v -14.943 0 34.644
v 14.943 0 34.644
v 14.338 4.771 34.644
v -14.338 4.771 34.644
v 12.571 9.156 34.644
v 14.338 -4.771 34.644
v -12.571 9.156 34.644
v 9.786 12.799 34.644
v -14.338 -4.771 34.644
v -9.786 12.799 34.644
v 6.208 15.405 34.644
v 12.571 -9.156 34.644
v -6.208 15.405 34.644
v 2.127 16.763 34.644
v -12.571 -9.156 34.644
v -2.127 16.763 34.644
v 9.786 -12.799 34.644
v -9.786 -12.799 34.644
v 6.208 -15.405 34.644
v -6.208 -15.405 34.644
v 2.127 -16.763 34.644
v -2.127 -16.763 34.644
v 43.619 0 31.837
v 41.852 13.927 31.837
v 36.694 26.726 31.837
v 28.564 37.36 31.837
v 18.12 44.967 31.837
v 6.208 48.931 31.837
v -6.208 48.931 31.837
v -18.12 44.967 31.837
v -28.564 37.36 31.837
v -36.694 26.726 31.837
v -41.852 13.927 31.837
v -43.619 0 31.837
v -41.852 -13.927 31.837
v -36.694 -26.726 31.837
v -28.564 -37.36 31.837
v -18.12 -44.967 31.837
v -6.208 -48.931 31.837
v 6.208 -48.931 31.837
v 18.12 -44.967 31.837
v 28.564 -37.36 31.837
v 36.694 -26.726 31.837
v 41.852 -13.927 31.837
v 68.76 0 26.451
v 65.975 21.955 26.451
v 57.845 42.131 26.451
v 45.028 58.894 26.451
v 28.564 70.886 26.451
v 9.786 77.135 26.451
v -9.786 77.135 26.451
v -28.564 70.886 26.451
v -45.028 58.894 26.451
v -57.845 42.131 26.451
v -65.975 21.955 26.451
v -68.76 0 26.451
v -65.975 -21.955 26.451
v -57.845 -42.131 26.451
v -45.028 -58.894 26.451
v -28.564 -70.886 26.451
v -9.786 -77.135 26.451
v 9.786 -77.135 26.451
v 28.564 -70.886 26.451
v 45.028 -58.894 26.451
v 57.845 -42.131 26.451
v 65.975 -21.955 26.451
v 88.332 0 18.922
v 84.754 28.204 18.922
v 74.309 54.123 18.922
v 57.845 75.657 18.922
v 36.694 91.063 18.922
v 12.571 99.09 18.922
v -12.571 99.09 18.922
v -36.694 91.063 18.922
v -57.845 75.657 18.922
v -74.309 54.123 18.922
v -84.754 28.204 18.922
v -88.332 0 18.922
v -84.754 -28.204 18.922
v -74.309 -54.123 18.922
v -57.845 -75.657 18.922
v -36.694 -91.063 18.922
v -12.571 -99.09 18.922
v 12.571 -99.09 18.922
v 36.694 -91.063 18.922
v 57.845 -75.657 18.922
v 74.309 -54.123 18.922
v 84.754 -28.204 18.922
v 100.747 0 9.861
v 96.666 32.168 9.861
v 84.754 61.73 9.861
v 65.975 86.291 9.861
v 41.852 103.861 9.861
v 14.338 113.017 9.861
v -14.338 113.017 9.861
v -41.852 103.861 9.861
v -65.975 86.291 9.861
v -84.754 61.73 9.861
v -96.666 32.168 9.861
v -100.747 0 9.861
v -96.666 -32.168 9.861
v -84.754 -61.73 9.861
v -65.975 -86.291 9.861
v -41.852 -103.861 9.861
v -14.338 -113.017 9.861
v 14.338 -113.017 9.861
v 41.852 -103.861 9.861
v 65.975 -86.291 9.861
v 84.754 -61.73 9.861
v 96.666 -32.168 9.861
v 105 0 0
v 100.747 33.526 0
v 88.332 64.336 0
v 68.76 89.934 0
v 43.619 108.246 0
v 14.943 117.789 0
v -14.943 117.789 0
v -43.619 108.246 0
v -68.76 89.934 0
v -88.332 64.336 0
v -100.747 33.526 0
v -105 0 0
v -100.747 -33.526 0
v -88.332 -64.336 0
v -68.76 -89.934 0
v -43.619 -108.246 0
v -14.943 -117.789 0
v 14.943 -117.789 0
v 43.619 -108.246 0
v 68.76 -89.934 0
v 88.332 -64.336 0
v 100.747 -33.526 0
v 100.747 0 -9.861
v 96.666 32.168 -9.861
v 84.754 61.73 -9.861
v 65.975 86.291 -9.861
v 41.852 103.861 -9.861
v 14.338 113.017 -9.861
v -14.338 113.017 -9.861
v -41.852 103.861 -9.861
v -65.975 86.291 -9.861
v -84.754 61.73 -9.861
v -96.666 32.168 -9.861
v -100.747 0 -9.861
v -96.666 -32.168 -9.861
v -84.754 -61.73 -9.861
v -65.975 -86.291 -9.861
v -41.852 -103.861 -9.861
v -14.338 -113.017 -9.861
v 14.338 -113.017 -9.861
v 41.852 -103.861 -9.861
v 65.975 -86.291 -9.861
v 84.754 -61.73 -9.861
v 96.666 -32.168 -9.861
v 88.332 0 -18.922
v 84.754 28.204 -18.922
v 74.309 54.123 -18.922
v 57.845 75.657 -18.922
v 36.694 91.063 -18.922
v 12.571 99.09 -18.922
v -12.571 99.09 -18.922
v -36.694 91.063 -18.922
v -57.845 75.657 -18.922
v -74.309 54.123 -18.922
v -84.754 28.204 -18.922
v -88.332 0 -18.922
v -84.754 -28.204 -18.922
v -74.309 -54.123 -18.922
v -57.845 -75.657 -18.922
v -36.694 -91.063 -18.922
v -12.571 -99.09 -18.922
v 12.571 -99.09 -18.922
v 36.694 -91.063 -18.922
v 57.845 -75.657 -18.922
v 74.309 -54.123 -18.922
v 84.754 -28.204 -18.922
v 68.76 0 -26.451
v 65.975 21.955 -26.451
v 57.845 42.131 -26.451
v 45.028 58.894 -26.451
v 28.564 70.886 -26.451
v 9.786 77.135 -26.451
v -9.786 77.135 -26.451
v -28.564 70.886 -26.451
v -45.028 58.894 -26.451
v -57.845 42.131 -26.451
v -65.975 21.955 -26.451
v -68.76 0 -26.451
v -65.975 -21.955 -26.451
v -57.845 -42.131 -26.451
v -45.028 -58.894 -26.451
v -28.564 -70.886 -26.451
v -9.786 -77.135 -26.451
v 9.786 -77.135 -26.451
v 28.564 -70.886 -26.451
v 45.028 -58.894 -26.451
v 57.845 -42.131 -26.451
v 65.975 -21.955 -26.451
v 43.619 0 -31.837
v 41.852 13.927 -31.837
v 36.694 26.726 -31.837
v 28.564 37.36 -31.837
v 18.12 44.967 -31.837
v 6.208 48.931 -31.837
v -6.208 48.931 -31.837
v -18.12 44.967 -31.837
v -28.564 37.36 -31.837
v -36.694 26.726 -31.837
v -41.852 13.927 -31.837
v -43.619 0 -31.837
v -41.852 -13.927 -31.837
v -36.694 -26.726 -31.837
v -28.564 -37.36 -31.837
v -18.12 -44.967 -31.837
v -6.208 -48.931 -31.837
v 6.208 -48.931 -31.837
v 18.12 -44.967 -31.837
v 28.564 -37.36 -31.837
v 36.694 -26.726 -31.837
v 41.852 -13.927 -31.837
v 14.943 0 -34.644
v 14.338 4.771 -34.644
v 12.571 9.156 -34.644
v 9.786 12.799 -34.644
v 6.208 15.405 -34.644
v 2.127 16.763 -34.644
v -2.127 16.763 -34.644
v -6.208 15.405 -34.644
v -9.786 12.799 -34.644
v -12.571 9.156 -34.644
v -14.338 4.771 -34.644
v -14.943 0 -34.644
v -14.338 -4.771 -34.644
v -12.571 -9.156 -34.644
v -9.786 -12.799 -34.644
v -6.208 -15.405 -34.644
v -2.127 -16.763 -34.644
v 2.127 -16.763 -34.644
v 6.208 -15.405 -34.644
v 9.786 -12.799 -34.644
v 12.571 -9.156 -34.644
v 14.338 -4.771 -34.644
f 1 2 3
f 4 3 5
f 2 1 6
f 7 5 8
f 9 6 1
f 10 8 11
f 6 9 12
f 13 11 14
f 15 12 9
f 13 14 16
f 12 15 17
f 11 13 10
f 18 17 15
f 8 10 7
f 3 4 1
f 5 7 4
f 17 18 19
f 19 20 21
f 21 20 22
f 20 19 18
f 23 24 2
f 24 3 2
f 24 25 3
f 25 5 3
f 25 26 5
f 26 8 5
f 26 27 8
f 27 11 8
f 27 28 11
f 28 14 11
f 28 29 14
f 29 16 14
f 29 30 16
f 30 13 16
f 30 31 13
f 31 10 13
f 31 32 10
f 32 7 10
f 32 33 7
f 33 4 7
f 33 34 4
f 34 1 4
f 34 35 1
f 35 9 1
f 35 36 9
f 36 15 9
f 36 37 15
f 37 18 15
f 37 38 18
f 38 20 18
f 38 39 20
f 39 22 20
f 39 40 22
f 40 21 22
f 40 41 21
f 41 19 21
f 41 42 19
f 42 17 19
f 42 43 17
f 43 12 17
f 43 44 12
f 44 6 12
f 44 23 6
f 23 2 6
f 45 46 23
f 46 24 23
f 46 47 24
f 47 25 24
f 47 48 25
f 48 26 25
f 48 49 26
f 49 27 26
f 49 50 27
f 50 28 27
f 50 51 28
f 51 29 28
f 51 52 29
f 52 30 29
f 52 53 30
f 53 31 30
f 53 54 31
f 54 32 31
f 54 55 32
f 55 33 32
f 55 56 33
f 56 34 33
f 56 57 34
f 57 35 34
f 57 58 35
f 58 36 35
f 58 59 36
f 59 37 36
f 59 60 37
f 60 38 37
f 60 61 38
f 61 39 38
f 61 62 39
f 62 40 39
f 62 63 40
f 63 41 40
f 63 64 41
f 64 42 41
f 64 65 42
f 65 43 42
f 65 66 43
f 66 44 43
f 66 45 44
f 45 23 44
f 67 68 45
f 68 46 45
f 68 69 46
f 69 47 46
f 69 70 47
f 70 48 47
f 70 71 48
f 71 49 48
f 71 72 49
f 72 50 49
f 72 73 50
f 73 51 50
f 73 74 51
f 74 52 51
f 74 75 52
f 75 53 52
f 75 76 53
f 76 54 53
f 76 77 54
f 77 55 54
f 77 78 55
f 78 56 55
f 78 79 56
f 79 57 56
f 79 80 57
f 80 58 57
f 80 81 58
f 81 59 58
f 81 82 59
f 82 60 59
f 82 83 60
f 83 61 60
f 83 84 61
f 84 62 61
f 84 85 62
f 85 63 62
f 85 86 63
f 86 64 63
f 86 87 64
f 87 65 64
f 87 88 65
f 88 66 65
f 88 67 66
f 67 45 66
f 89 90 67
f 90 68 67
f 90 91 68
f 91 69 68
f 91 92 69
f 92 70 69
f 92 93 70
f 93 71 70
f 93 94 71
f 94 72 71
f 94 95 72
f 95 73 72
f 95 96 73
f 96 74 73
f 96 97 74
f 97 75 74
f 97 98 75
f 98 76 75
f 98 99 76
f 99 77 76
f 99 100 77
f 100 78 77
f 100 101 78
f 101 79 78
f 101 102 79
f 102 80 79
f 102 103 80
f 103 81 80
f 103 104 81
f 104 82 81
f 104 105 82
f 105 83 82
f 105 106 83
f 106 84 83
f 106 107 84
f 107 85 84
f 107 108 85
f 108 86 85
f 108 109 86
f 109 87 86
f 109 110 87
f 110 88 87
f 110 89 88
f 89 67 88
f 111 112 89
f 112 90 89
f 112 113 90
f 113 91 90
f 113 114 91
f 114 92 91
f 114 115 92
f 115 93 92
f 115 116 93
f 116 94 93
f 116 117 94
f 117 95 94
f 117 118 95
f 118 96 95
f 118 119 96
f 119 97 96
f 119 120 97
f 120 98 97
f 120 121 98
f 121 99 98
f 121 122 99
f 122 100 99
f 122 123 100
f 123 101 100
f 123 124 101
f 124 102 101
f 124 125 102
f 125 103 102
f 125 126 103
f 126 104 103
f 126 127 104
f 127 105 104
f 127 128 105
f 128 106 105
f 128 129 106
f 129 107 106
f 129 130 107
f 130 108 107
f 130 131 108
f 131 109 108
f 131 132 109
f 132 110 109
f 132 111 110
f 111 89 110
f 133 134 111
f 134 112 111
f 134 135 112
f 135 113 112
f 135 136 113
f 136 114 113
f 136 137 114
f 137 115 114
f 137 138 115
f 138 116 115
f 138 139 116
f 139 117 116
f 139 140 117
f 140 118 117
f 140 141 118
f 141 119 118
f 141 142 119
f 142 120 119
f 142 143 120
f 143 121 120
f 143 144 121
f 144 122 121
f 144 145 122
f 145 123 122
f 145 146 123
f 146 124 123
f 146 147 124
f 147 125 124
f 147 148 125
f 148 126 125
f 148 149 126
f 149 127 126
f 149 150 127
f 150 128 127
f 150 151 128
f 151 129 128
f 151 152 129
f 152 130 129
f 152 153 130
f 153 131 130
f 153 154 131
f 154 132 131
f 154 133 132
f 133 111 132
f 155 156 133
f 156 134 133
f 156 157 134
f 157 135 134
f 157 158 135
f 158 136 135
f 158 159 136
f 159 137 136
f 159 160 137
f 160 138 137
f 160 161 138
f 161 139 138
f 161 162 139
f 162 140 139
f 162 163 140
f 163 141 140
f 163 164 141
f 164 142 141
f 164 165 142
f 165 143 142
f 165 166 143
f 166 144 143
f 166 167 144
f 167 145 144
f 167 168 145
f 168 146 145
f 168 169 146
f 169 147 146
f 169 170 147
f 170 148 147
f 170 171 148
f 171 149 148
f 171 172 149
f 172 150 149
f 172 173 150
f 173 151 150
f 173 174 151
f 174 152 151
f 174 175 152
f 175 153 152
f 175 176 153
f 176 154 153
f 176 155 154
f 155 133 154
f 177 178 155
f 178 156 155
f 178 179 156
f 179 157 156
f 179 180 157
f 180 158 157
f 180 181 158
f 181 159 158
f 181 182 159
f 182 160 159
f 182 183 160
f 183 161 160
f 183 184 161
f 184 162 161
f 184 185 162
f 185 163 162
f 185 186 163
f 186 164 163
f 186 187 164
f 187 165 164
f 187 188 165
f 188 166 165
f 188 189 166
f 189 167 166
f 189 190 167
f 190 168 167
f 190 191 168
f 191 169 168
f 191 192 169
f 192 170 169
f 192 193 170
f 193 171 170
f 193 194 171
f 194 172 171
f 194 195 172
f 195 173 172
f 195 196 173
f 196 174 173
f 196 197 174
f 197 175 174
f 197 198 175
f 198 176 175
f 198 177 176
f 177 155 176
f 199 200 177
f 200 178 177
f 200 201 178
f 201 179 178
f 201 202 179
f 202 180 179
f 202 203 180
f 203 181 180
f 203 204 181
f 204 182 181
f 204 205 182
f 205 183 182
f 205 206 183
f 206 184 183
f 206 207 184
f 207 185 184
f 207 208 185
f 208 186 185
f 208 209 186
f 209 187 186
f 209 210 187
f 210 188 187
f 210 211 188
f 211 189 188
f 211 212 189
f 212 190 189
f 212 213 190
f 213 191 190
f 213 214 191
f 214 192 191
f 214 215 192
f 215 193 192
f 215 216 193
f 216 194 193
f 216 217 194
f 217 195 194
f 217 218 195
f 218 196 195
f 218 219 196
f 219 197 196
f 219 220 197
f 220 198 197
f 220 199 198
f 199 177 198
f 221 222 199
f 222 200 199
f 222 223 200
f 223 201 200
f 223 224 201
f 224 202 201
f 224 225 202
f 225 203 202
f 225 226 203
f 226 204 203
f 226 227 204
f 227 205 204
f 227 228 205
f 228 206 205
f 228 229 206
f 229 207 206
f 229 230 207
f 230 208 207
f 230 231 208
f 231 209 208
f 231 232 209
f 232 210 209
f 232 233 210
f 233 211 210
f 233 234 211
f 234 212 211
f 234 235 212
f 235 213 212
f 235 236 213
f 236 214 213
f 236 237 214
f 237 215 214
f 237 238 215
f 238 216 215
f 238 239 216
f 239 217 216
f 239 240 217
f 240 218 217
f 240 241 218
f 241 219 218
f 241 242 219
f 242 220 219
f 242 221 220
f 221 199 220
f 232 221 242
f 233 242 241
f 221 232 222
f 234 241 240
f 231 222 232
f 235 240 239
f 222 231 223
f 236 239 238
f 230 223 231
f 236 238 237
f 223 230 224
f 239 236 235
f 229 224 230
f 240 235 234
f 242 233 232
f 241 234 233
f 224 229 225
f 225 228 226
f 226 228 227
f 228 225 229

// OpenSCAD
// Generated by SolidPython 1.0.1 on 2020-07-29 00:46:52


scale(v = [15, 17, 5]) {
	sphere(r = 7);
}
/***********************************************
*********      SolidPython code:      **********
************************************************
 
# import packages: SolidPython
from solid import *
from solid.utils import *
from itertools import chain, combinations, permutations


class Resize:

    def __init__(self, scad_file):
        self.scad_file = scad_file
        #self.scad_file = import_scad(scad_file)
        # cone/cylinder param:
        self.r1 = 0
        self.r2 = 0
        self.h = 0
        # rectangular prism param:
        self.w = 0
        self.l = 0
        # ellipse param:
        self.r = 0

    # import OpenScad code (file name corresponds to shape)


    # classify shape + parameters
    def assign(self, param1, param2, param3):
        if self.scad_file == 'cone.scad':
            self.r1 = param1
            self.r2 = param2
            self.h = param3
        elif self.scad_file == 'cylinder.scad':
            self.r1 = param1
            self.r2 = param2
            self.h = param3
        elif self.scad_file == 'rectangularPrism.scad':
            self.h = param1
            self.l = param2
            self.w = param3
        else:
            self.r = param1
            self.h = param2

    # resize parameters
    def iterate(self):
        x = range(3, 20, 2)
        i = 1
        if self.scad_file == 'cone.scad':
            tempList = list(permutations(x, 2))
            for temp in tempList:
                param1 = temp[0]
                param2 = temp[1]
                filepath = 'produced_scad_files/' + 'cone' + str(param1) + '_' + str(param2) + '_' + '.scad'
                scad_render_to_file(cylinder(h=param1, r1=param2, r2=0), filepath)

        elif self.scad_file == 'cylinder.scad':
            tempList = list(permutations(x, 3))
            for temp in tempList:
                param1 = temp[0]
                param2 = temp[1]
                filepath = 'produced_scad_files/' + 'cylinder' + str(param1) + '_' + str(param2) + '_' + '.scad'
                scad_render_to_file(cylinder(h=param1, r1=param2, r2=param2), filepath)

        elif self.scad_file == 'rectangularPrism.scad':
            tempList = list(permutations(x, 3))
            for temp in tempList:
                param1 = temp[0]
                param2 = temp[1]
                param3 = temp[2]
                filepath = 'produced_scad_files/' + 'rectangularPrism' + str(param1) + '_' + str(param2) + '_' + str(
                    param3) + '.scad'
                scad_render_to_file(cube(size=(param1, param2, param3)), filepath)

        elif self.scad_file == 'ellipse.scad':
            tempList = list(permutations(x, 4))
            for temp in tempList:
                param1 = temp[0]
                param2 = temp[1]
                param3 = temp[2]
                param4 = temp[3]
                filepath = 'produced_scad_files/' + 'ellipse' + str(param1) + '_' + str(param2) + '_' + str(param3) + '_' + str(param4) + '.scad'
                scad_render_to_file(scale([param1, param2, param3])(sphere(r=param4)), filepath)

    def render_to_scadfile(self):
        scad_render_to_file(scad, 'example.scad') 
 
************************************************/
